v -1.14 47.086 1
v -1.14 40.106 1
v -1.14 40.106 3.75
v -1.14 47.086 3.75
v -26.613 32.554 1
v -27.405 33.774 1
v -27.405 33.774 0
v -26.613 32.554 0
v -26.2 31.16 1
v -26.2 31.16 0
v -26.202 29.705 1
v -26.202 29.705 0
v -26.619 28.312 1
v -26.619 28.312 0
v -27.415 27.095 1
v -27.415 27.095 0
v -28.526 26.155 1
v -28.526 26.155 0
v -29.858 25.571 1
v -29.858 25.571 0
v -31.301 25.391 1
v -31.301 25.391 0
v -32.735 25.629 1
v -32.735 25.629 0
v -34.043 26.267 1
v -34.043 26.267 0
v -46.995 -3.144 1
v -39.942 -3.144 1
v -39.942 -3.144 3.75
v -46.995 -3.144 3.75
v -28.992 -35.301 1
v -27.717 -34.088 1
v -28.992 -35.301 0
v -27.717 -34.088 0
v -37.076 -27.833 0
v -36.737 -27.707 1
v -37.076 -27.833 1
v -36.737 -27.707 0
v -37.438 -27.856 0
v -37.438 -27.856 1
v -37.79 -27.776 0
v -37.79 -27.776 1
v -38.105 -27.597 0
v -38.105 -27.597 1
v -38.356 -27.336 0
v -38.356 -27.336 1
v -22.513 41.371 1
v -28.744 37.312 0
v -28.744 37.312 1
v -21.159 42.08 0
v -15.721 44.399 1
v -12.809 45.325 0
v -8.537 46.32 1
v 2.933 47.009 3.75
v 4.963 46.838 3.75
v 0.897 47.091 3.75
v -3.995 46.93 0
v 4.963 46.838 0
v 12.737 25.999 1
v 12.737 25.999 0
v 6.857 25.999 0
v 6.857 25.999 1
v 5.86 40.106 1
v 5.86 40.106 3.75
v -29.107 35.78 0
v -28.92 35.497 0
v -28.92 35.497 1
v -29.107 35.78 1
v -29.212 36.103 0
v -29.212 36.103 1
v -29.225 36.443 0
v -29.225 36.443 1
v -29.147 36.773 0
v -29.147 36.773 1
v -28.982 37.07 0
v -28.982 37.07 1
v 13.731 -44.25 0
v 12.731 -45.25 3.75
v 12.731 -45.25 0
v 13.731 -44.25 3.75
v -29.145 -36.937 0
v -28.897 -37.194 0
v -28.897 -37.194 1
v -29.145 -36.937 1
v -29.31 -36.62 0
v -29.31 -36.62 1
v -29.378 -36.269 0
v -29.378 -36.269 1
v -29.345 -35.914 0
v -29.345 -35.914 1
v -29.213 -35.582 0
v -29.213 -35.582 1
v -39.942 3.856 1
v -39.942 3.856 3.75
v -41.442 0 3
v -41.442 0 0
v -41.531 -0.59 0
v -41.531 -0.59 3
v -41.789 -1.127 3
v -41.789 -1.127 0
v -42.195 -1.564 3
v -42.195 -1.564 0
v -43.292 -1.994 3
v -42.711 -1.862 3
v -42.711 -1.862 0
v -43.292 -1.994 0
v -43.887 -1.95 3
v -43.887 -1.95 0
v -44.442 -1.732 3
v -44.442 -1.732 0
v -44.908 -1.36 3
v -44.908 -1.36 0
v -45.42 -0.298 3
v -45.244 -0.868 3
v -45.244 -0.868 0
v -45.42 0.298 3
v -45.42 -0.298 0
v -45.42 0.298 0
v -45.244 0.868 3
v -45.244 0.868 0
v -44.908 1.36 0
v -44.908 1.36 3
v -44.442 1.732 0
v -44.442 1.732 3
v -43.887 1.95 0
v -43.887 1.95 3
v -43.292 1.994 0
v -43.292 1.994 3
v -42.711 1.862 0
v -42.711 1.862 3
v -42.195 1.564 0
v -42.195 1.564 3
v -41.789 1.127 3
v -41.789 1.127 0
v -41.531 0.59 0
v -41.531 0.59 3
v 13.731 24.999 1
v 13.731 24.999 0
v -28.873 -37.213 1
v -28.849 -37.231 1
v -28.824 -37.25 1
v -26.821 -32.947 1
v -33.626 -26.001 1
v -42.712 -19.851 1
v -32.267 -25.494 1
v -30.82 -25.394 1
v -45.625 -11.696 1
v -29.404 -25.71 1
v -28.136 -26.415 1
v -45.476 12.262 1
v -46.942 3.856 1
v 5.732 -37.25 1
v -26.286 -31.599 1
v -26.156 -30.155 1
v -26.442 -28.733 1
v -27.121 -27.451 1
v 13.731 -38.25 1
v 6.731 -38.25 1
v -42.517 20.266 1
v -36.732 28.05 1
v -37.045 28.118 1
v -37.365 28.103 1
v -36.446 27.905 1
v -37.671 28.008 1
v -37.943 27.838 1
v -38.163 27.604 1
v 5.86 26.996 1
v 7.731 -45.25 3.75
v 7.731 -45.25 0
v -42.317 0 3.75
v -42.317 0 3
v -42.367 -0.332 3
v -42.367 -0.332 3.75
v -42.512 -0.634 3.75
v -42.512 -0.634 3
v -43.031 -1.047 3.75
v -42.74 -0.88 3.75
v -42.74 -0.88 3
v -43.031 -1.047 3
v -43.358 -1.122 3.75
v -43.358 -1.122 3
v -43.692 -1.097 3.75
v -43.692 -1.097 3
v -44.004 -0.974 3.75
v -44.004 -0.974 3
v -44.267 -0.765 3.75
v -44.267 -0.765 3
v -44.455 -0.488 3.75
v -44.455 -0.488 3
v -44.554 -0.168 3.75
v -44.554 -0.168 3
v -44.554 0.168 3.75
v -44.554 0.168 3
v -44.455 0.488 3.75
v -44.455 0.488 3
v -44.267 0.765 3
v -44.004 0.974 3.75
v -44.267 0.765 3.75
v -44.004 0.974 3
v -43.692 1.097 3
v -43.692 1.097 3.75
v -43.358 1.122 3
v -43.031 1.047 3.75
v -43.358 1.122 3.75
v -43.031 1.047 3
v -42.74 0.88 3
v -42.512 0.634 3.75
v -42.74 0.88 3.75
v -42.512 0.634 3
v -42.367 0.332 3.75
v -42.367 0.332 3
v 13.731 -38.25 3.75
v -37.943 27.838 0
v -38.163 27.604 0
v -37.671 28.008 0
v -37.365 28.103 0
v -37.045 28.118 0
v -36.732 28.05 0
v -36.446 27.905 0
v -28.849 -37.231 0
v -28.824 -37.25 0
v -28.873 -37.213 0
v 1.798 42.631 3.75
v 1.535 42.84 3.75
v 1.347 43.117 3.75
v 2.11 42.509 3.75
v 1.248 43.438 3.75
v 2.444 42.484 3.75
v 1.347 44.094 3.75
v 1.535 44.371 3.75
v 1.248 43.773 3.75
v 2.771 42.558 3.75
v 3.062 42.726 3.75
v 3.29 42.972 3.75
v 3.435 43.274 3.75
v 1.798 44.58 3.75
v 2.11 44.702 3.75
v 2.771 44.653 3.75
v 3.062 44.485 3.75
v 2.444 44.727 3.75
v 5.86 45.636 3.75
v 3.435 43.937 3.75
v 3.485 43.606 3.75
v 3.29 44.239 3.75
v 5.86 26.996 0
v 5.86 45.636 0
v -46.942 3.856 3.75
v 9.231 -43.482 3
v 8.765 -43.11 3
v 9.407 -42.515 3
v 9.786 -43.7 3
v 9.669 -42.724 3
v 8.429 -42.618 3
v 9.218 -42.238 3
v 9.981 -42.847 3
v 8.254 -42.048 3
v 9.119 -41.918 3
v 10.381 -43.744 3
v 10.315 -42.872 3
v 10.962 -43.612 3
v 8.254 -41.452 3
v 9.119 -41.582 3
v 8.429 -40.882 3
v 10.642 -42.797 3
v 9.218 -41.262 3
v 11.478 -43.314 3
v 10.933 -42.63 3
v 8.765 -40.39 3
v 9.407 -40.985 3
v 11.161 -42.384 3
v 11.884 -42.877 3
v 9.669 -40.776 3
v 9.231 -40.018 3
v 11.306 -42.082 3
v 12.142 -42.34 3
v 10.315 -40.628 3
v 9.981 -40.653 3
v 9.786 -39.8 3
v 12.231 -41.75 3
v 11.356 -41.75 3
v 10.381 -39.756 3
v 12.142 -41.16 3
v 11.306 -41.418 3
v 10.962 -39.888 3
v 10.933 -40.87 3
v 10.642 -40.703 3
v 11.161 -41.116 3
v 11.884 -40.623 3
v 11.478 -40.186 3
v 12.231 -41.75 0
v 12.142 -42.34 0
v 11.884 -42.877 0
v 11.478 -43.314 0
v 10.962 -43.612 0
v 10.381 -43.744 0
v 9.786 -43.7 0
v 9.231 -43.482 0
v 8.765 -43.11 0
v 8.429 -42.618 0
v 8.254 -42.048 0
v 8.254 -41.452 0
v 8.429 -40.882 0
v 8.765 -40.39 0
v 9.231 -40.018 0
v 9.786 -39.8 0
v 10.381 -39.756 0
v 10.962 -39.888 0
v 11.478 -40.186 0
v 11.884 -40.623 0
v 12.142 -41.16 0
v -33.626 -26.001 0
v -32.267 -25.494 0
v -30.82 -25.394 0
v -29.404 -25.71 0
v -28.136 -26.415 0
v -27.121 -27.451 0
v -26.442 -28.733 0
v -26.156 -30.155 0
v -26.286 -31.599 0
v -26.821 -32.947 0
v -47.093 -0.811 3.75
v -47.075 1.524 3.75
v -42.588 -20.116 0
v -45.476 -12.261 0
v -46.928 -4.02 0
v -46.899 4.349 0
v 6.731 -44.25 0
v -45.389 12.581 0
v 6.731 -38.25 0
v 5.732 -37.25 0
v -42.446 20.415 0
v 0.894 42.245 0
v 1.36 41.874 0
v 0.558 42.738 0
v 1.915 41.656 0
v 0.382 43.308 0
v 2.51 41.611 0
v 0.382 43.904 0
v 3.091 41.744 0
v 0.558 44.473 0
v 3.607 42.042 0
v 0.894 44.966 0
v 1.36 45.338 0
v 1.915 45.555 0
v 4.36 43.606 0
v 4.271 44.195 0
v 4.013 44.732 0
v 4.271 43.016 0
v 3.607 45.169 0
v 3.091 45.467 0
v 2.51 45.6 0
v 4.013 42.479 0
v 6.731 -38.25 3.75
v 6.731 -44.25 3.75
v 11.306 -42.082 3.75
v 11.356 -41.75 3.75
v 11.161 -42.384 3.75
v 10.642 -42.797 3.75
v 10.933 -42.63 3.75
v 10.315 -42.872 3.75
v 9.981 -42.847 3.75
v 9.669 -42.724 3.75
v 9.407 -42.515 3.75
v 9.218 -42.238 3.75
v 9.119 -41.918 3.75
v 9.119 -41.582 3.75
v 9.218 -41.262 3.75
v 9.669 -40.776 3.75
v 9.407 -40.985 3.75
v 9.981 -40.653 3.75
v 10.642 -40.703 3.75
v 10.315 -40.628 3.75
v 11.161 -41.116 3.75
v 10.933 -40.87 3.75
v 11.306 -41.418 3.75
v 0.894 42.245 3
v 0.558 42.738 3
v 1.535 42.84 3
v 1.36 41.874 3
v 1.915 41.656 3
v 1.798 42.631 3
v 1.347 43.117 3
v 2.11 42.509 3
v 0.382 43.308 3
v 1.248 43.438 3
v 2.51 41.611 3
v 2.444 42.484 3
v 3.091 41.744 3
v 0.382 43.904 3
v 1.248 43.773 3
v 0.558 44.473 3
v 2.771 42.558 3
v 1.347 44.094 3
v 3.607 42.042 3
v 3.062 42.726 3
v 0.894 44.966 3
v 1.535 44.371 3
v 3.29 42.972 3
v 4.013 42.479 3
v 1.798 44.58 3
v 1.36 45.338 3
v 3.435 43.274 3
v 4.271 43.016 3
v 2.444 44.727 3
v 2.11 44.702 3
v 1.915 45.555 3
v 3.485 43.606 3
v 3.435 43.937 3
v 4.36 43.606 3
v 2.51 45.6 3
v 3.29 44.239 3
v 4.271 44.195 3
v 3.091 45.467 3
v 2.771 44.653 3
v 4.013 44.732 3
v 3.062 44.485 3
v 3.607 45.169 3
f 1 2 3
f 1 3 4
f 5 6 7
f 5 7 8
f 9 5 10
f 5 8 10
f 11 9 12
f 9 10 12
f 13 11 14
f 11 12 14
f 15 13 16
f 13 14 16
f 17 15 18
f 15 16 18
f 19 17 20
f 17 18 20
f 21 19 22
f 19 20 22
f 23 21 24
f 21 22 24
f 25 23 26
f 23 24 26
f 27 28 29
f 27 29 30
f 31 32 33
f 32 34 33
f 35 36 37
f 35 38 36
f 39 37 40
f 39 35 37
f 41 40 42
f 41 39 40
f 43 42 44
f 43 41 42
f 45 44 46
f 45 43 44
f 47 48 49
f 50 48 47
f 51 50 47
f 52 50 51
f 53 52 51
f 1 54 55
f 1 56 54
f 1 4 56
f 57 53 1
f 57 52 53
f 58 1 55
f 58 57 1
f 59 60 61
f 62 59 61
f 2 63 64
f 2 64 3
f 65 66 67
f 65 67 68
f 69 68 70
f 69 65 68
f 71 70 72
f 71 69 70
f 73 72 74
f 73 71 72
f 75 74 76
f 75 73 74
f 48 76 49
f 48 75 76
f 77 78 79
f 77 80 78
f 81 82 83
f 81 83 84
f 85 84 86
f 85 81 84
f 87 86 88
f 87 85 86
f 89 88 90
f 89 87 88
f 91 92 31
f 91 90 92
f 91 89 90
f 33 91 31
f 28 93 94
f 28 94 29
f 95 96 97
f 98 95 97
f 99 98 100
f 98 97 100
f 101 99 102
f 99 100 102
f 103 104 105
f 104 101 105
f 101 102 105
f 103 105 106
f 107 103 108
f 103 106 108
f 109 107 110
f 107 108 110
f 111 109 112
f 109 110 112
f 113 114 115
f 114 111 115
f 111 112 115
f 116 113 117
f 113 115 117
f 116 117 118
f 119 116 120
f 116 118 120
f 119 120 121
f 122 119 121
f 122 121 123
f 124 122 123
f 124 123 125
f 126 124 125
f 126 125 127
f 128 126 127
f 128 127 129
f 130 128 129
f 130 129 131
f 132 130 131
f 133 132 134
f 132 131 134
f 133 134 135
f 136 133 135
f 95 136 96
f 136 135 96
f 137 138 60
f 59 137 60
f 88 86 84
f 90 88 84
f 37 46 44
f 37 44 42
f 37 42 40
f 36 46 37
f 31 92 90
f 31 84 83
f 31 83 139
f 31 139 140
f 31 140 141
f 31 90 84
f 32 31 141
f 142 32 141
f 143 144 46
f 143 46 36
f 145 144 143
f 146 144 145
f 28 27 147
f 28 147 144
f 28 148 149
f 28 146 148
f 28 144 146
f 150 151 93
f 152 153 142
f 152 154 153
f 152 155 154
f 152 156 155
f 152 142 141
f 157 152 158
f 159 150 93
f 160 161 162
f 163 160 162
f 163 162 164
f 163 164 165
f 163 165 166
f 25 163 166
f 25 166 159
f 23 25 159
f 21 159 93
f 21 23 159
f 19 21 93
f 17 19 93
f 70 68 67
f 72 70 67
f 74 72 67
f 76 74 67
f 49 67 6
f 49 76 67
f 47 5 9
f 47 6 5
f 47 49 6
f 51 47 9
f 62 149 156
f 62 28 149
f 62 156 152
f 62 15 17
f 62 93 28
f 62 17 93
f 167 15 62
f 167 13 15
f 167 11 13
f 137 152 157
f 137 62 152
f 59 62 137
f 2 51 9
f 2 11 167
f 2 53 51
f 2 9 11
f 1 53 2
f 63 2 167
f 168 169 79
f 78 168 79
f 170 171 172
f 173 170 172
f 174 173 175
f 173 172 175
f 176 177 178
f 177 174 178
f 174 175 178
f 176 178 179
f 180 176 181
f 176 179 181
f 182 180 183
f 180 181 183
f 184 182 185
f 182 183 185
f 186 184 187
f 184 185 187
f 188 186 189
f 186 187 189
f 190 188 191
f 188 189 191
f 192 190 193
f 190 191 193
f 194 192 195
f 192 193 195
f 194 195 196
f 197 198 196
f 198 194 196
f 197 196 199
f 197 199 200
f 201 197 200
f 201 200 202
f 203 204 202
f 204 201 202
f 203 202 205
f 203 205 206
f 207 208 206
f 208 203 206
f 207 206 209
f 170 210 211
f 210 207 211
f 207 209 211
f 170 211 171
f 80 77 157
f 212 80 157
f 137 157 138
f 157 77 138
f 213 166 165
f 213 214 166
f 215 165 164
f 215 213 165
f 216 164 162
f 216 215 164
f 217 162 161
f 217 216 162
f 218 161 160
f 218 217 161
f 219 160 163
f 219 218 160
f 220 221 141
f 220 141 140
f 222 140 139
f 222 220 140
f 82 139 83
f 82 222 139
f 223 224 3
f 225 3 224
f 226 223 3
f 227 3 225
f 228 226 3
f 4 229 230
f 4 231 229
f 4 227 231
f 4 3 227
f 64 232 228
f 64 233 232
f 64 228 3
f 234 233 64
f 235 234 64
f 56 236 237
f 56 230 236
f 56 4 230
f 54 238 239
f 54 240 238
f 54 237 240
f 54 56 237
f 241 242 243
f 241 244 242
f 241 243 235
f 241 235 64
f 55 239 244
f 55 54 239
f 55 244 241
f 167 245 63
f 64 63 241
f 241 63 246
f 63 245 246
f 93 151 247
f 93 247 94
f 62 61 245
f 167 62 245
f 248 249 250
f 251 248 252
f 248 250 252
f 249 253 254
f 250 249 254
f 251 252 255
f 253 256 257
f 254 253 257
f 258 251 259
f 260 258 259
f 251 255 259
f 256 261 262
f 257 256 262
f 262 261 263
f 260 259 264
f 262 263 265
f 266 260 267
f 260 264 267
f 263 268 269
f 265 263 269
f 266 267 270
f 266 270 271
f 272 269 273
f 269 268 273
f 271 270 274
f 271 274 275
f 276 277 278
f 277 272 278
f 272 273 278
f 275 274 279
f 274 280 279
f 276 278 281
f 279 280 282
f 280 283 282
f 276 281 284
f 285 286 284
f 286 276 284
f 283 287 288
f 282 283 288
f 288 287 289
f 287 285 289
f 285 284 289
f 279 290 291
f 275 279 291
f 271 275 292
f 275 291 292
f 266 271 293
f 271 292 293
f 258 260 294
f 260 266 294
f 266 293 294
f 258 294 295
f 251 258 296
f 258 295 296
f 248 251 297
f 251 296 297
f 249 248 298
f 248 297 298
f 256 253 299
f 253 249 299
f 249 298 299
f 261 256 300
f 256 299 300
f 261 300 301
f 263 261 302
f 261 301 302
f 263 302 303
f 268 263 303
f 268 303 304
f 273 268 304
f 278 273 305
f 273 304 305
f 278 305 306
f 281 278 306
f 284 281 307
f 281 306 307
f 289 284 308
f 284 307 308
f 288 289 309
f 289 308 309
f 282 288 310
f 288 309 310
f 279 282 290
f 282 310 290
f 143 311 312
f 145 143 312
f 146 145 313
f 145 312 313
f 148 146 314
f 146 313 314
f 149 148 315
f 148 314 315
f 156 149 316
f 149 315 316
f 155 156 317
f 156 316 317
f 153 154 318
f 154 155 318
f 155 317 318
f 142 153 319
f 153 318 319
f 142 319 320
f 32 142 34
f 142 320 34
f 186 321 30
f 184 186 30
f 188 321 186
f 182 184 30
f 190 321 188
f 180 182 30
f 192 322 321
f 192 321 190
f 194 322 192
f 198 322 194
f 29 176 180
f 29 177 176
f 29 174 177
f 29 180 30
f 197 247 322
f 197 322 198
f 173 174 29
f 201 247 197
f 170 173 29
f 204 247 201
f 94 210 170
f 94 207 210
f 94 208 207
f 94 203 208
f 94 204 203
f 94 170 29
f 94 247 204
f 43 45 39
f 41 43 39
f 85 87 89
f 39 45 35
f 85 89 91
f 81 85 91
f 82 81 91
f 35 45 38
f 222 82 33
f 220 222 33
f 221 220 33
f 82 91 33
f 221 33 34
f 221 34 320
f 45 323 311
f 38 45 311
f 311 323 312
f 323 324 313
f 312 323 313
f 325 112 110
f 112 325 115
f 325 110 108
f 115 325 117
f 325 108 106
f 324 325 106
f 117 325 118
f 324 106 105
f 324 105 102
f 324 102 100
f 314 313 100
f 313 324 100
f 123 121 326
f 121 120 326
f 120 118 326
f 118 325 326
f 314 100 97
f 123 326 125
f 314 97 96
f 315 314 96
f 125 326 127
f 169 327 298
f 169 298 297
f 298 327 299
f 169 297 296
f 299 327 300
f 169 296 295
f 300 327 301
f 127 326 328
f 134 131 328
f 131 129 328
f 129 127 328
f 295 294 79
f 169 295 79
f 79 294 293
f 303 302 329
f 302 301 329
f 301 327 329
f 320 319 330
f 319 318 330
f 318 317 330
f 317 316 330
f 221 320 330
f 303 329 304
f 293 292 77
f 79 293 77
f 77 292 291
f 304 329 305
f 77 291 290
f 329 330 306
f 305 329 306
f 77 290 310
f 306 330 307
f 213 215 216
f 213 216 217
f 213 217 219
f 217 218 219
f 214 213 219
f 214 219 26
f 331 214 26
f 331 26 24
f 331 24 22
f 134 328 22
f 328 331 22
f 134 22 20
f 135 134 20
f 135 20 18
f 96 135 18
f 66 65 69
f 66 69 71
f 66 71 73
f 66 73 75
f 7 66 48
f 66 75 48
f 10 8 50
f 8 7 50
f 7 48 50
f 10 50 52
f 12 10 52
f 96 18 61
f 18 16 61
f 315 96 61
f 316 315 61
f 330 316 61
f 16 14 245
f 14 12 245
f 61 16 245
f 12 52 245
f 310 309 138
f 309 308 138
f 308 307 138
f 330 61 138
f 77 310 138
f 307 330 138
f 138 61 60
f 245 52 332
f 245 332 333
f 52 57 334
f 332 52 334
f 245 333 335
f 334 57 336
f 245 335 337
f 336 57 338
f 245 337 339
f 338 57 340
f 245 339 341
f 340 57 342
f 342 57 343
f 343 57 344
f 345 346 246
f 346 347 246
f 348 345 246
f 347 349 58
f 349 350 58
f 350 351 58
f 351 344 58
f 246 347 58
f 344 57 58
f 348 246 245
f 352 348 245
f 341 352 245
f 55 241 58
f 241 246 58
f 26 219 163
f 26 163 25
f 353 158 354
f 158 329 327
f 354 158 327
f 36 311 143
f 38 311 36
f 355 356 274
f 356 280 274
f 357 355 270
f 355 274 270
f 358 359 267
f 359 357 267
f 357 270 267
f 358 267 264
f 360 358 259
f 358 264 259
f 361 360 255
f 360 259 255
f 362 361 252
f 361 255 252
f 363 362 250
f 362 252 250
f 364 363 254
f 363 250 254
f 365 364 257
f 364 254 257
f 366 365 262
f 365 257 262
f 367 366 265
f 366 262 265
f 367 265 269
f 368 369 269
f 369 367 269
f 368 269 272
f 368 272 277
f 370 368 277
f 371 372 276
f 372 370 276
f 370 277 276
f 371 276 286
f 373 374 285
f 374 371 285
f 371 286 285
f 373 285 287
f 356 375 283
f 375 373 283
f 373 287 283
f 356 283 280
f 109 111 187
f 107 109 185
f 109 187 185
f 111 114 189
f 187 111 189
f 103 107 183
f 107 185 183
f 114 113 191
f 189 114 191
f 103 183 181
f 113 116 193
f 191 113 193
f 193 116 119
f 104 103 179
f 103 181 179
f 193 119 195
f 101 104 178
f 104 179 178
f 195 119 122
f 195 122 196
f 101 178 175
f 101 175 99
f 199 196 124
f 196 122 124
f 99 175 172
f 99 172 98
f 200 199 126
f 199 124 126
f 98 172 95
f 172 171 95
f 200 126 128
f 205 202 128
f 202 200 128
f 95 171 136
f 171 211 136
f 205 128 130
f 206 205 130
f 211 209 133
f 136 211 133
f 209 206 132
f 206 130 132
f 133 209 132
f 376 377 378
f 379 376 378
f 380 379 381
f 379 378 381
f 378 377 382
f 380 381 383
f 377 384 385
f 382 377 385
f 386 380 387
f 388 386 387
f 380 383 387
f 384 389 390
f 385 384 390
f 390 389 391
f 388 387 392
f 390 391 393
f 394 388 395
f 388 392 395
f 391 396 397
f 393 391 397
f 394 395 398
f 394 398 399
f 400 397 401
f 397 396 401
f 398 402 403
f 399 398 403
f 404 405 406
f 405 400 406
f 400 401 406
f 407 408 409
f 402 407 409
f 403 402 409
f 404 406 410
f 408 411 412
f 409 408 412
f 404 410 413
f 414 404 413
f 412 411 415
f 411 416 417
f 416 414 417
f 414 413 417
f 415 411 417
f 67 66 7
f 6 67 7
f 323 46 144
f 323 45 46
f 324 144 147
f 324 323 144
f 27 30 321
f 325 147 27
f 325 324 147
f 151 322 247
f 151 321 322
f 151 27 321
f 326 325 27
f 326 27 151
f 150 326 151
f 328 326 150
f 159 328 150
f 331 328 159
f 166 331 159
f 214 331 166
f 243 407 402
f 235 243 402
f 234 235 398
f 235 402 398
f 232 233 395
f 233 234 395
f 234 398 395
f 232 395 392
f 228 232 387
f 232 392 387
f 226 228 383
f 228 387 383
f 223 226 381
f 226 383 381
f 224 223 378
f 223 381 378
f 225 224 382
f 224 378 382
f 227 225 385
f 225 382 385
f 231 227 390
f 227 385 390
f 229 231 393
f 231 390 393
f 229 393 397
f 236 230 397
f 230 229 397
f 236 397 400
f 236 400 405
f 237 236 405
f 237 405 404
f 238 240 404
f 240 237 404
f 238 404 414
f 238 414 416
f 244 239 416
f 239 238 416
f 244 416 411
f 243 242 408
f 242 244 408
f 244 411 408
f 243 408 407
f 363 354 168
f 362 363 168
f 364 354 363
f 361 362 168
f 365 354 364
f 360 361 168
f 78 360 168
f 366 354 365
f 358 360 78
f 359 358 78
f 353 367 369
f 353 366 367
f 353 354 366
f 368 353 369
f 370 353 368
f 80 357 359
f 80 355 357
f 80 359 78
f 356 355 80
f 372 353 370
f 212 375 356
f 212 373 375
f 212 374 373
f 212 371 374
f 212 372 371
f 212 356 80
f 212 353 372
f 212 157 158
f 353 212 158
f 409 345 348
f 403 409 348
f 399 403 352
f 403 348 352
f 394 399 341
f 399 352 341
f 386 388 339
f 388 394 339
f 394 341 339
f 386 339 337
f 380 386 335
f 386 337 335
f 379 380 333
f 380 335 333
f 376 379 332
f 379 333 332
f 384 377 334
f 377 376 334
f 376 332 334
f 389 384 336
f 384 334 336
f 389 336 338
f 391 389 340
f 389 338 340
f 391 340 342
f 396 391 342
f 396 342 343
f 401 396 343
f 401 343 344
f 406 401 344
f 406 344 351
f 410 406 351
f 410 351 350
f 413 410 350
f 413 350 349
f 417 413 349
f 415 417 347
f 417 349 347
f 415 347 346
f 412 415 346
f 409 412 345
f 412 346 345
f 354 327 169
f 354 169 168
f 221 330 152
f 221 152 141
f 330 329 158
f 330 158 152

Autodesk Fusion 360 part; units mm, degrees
sketch "Esboço1" plane through (0, 0, 0) normal (0, 0, 1) x (1, 0, 0)
  line L0 (0, -37.25) -> (5.7315, -37.25)
  line L1 (0, -37.25) -> (-28.8244, -37.25)
  line L2 (13.7313, -37.25) -> (13.7313, -38.25)
  line L3 (13.7313, -38.25) -> (6.7313, -38.25)
  line L4 (6.7313, -38.25) -> (5.7315, -37.2502)
  line L5 (-33.6257, -26.0014) -> (-36.7371, -27.7066)
  line L6 (-27.7171, -34.088) -> (-28.9918, -35.3012)
  arc A0 (-31.1987, -35.48) -> (-30.9824, -35.4754) centre (-31.1987, -30.43) ccw
  arc A1 (-27.7171, -34.088) -> (-33.6257, -26.0014) centre (-31.1987, -30.43) ccw
  arc A2 (-31.1987, -35.2853) -> (-30.9824, -35.4754) centre (0, 0) ccw
  arc A3 (-28.8969, -37.1938) -> (-28.8244, -37.25) centre (0, 0) ccw
  arc A4 (-28.9918, -35.3012) -> (-28.8969, -37.1938) centre (-28.13, -36.2067) ccw
  arc A5 (-38.3557, -27.3358) -> (-36.7371, -27.7066) centre (-37.3378, -26.6104) ccw
  line L7 (13.7313, -45.25) -> (13.7313, -37.25)
  line L8 (13.7313, -30.43) -> (13.7313, 24.9988)
  line L9 (5.7315, -37.2502) -> (5.7315, -37.25)
  line L10 (13.7313, -37.25) -> (13.7313, -30.43)
  line L11 (6.7313, -38.25) -> (6.7313, -45.25)
  line L12 (6.7313, -45.25) -> (13.7313, -45.25)
  arc A6 (-34.0426, 26.2669) -> (-27.4054, 33.7737) centre (-31.1987, 30.44) ccw
  line L13 (-28.9198, 35.4969) -> (-27.4054, 33.7737)
  line L14 (-36.4461, 27.9049) -> (-34.0426, 26.2669)
  arc A7 (4.963, 46.8378) -> (-28.7437, 37.3123) centre (0, 0) ccw
  arc A8 (-38.1628, 27.6045) -> (-38.3557, -27.3358) centre (0, 0) ccw
  arc A9 (-28.7437, 37.3123) -> (-28.9198, 35.4969) centre (-27.9809, 36.3221) ccw
  arc A10 (-36.4461, 27.9049) -> (-38.1628, 27.6045) centre (-37.15, 26.8719) ccw
  line L15 (13.7313, 24.9988) -> (12.7371, 25.9986)
  line L16 (12.7371, 25.9986) -> (6.8571, 25.9986)
  line L17 (6.8571, 25.9986) -> (5.8601, 26.9956)
  line L18 (5.8601, 26.9956) -> (5.8601, 45.6356)
  line L19 (5.8601, 45.6356) -> (4.963, 46.8378)
  line L20 (5.8601, 40.1056) -> (-1.1399, 40.1056)
  line L21 (-1.1399, 40.1056) -> (-1.1399, 47.0862)
  line L22 (-46.9419, 3.8556) -> (-39.9419, 3.8556)
  line L23 (-39.9419, 3.8556) -> (-39.9419, -3.1444)
  line L24 (-39.9419, -3.1444) -> (-46.9949, -3.1444)
  circle A11 centre (-43.4419, 0) radius 2
  circle A12 centre (-43.4419, 0) radius 1.125
  circle A13 centre (10.2313, -41.75) radius 2
  circle A14 centre (10.2313, -41.75) radius 1.125
  circle A15 centre (2.3601, 43.6056) radius 2
  circle A16 centre (2.3601, 43.6056) radius 1.125
  dimension "d1" = 94.2
  dimension "d3" = 37.25
  dimension "d5" = 1
  dimension "d6" = 7
  dimension "d7" = 1.414
  dimension "d8" = 135
  dimension "d9" = 44.93
  dimension "d11" = 10.1
  dimension "d12" = 1.25
  dimension "d13" = 1.25
  dimension "d14" = 7
  dimension "d16" = 60.87
  dimension "d17" = 10.1
  dimension "d18" = 1.25
  dimension "d19" = 1.25
  dimension "d21" = 1.41
  dimension "d22" = 5.88
  dimension "d23" = 1.41
  dimension "d24" = 135
  dimension "d25" = 18.64
  dimension "d26" = 1.5
  dimension "d28" = 7
  dimension "d30" = 7
  dimension "d31" = 7
  dimension "d32" = 7.053
  dimension "d34" = 4
  dimension "d35" = 2.25
  dimension "d38" = 4
  dimension "d39" = 2.25
  dimension "d41" = 4
  dimension "d42" = 2.25
extrude "Extrusão1" add sketch "Esboço1" along normal blind 1 contours L0 L1 L2 L3 L4 L5 L6 A1 A3 A4 A5 L7 L8 L10 A6 L13 L14 A7 A8 A9 A10 L15 L16 L17 L18 L20 L21 L22 L23 L24
extrude "Extrusão2" add sketch "Esboço1" along normal blind 3.75 contours A8 L22 L23 L24 | A11
extrude "Extrusão3" cut sketch "Esboço1" along normal blind 3 contours A11
extrude "Extrusão4" add sketch "Esboço1" along normal blind 3.75 contours L3 L7 L11 L12 | A13
extrude "Extrusão5" cut sketch "Esboço1" along normal blind 3 contours A13
extrude "Extrusão6" add sketch "Esboço1" along normal blind 3.75 contours A7 L18 L19 L20 L21 | A15
extrude "Extrusão7" cut sketch "Esboço1" along normal blind 3 contours A15
chamfer "Chanfro1" distance 1 angle 45 1 edges at (13.7313, -45.25, 1.875)
chamfer "Chanfro2" distance 1 angle 45 1 edges at (6.7313, -45.25, 1.875)
equation "d1 = ( 47.1 * 2 ) * 1 mm"
